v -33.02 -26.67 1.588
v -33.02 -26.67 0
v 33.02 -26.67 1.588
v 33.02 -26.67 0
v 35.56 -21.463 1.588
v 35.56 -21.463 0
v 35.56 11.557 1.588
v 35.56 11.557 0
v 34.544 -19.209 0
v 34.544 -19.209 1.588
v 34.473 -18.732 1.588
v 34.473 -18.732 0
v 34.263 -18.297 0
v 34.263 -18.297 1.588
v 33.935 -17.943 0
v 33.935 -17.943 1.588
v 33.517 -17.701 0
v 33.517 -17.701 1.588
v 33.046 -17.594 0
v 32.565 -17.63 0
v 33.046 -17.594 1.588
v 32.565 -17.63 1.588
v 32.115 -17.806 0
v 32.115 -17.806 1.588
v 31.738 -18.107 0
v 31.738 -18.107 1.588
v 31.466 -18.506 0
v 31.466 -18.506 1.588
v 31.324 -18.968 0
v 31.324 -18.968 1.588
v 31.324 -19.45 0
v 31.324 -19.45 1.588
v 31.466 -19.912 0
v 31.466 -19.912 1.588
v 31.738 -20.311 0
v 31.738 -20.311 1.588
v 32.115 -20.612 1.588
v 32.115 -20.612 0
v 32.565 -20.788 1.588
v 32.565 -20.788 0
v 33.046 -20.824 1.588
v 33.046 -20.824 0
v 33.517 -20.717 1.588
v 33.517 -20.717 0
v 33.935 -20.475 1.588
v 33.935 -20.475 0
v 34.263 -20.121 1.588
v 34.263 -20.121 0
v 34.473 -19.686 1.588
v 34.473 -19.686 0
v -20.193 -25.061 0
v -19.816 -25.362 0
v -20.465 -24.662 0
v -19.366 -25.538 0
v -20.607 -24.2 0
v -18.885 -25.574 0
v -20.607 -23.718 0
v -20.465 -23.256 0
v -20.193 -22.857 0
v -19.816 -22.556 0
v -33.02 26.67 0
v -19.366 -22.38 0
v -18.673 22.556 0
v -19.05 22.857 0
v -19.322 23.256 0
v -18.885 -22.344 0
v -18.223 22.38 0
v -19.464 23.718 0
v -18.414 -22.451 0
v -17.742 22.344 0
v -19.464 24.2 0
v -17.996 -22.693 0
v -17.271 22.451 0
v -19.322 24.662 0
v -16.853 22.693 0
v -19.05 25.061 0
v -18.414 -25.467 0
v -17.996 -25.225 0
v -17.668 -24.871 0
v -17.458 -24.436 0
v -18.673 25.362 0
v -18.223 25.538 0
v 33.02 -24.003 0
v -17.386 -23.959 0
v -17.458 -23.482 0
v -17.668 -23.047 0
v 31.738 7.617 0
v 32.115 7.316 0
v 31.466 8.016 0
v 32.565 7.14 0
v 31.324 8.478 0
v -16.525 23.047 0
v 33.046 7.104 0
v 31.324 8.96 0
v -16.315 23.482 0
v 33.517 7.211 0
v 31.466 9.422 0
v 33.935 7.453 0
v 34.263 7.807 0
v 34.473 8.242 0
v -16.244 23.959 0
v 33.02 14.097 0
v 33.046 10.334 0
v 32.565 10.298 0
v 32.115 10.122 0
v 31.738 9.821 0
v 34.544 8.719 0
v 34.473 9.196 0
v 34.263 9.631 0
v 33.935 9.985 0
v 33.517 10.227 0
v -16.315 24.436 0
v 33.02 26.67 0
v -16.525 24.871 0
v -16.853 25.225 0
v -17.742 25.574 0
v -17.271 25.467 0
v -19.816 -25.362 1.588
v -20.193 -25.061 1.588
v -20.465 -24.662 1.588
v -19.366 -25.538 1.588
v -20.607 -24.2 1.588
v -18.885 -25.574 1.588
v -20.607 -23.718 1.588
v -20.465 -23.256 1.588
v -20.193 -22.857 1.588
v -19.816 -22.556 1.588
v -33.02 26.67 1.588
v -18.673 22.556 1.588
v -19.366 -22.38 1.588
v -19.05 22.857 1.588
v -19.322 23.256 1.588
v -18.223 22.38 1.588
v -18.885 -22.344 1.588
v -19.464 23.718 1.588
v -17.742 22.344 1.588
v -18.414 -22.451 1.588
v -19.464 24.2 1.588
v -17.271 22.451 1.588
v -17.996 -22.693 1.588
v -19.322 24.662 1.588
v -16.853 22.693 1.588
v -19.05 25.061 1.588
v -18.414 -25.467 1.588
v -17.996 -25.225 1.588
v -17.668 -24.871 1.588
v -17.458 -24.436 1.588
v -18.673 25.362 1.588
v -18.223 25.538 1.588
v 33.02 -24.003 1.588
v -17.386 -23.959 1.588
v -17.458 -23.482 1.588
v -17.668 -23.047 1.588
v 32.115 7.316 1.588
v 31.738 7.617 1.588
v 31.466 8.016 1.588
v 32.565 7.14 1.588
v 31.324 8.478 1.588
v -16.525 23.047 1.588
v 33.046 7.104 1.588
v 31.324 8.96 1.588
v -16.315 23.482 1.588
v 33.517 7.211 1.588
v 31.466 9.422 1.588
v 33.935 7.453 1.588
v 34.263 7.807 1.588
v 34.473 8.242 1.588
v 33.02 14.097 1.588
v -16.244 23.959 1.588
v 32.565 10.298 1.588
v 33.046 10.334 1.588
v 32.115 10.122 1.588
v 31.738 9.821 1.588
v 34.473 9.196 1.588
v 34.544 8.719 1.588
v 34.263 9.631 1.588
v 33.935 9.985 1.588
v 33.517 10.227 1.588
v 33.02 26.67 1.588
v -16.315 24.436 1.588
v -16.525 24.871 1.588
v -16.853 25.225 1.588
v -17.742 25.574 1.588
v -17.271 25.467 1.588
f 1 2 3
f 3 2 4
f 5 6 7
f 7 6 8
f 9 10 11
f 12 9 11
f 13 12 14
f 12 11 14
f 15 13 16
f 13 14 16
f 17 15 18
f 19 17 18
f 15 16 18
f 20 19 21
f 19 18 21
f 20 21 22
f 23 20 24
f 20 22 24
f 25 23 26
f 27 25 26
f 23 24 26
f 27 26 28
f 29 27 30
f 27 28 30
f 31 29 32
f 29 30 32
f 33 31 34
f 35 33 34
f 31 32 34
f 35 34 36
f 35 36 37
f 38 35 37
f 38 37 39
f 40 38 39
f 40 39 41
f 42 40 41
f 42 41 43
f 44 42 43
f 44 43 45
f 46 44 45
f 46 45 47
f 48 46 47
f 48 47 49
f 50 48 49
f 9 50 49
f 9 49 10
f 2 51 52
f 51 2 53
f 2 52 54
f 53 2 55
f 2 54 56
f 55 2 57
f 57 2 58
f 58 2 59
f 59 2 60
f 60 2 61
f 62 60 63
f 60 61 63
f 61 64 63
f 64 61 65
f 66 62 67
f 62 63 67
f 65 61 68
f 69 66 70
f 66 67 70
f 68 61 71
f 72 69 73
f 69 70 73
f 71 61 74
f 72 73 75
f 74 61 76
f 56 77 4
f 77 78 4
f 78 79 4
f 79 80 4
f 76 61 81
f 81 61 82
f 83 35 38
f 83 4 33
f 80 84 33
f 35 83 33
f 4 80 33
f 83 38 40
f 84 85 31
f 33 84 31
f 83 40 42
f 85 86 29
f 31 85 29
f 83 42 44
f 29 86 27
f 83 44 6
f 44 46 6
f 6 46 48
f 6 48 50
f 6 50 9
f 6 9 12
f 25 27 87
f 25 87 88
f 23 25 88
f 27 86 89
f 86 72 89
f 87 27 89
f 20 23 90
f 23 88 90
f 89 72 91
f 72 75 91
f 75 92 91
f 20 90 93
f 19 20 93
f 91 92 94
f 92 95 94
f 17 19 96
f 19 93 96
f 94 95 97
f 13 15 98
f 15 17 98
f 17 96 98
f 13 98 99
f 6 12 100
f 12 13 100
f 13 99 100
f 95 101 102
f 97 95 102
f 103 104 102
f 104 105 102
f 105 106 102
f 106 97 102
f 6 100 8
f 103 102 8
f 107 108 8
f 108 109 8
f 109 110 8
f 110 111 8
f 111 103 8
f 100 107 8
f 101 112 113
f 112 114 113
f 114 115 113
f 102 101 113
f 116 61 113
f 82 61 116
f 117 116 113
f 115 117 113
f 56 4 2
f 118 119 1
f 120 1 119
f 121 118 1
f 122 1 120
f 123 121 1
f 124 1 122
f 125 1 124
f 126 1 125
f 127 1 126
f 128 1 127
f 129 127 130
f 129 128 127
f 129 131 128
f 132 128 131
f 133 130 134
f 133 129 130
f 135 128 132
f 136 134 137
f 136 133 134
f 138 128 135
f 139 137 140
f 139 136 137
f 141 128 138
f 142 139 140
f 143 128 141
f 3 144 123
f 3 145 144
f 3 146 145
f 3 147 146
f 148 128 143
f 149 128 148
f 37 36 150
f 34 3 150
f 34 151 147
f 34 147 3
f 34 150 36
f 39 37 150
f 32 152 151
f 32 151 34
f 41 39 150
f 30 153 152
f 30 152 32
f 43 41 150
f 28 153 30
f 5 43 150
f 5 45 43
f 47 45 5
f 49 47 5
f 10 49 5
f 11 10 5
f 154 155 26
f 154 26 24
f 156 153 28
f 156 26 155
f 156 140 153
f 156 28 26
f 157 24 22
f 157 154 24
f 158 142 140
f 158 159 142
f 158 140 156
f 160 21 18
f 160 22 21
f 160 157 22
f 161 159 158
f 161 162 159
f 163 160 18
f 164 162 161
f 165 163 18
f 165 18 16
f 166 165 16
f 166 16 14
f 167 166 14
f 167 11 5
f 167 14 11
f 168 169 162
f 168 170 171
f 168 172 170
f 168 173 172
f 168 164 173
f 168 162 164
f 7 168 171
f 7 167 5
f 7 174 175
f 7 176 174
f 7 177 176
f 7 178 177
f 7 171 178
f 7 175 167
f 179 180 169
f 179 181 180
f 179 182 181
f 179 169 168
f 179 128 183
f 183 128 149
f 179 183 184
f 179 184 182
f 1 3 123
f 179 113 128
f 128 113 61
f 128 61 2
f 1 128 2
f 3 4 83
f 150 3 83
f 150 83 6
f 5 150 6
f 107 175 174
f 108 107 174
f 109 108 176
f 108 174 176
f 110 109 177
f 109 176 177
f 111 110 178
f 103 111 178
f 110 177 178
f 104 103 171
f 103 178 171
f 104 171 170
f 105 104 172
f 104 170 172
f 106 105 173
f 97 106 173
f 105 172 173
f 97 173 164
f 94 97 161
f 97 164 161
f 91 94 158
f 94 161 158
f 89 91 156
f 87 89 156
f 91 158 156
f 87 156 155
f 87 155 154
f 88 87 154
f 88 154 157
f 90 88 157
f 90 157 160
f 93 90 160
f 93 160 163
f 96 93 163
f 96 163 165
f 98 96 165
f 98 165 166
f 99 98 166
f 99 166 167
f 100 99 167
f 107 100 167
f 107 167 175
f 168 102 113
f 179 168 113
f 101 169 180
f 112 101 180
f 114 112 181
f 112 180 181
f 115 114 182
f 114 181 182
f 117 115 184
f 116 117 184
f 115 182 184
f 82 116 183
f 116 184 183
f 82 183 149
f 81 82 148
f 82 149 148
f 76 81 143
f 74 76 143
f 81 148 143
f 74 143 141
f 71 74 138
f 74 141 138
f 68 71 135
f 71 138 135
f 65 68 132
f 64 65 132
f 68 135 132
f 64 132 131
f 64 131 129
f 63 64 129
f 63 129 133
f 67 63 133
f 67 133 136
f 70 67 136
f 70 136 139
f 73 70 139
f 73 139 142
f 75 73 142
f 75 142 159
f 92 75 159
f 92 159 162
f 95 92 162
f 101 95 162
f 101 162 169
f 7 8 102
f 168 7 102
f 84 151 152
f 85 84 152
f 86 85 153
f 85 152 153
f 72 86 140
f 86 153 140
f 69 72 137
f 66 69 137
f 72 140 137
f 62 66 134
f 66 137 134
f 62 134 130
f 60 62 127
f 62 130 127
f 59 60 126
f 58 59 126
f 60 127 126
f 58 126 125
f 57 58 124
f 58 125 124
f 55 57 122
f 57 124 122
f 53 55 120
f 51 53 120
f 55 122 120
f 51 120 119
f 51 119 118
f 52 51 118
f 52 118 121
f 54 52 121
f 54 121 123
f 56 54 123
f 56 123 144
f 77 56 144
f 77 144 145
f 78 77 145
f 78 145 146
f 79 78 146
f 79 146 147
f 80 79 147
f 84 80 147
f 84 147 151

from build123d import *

# Parameters (mm, degrees)
F1_DEPTH = 1.588
F2_R     = 1.6195
F3_DEPTH = 1.589


with BuildPart() as f1:
    # F0 (on Top) → F1 (new body)
    with BuildSketch(Plane.XY):
        Polygon((33.02, 26.67), (-33.02, 26.67), (-33.02, -26.67), (33.02, -26.67), (33.02, -24.003), (35.56, -21.463), (35.56, 11.557), (33.02, 14.097), align=None)
    extrude(amount=F1_DEPTH)

    # F2 (on face) → F3 (cut, through all)
    with BuildSketch(Plane.XY.offset(1.588)):
        with Locations((-17.863, 23.959)):
            Circle(F2_R)
        with Locations((-19.006, -23.959)):
            Circle(F2_R)
        with Locations((32.925, 8.719)):
            Circle(F2_R)
        with Locations((32.925, -19.209)):
            Circle(F2_R)
    extrude(amount=-F3_DEPTH, mode=Mode.SUBTRACT)


solid = f1.part
